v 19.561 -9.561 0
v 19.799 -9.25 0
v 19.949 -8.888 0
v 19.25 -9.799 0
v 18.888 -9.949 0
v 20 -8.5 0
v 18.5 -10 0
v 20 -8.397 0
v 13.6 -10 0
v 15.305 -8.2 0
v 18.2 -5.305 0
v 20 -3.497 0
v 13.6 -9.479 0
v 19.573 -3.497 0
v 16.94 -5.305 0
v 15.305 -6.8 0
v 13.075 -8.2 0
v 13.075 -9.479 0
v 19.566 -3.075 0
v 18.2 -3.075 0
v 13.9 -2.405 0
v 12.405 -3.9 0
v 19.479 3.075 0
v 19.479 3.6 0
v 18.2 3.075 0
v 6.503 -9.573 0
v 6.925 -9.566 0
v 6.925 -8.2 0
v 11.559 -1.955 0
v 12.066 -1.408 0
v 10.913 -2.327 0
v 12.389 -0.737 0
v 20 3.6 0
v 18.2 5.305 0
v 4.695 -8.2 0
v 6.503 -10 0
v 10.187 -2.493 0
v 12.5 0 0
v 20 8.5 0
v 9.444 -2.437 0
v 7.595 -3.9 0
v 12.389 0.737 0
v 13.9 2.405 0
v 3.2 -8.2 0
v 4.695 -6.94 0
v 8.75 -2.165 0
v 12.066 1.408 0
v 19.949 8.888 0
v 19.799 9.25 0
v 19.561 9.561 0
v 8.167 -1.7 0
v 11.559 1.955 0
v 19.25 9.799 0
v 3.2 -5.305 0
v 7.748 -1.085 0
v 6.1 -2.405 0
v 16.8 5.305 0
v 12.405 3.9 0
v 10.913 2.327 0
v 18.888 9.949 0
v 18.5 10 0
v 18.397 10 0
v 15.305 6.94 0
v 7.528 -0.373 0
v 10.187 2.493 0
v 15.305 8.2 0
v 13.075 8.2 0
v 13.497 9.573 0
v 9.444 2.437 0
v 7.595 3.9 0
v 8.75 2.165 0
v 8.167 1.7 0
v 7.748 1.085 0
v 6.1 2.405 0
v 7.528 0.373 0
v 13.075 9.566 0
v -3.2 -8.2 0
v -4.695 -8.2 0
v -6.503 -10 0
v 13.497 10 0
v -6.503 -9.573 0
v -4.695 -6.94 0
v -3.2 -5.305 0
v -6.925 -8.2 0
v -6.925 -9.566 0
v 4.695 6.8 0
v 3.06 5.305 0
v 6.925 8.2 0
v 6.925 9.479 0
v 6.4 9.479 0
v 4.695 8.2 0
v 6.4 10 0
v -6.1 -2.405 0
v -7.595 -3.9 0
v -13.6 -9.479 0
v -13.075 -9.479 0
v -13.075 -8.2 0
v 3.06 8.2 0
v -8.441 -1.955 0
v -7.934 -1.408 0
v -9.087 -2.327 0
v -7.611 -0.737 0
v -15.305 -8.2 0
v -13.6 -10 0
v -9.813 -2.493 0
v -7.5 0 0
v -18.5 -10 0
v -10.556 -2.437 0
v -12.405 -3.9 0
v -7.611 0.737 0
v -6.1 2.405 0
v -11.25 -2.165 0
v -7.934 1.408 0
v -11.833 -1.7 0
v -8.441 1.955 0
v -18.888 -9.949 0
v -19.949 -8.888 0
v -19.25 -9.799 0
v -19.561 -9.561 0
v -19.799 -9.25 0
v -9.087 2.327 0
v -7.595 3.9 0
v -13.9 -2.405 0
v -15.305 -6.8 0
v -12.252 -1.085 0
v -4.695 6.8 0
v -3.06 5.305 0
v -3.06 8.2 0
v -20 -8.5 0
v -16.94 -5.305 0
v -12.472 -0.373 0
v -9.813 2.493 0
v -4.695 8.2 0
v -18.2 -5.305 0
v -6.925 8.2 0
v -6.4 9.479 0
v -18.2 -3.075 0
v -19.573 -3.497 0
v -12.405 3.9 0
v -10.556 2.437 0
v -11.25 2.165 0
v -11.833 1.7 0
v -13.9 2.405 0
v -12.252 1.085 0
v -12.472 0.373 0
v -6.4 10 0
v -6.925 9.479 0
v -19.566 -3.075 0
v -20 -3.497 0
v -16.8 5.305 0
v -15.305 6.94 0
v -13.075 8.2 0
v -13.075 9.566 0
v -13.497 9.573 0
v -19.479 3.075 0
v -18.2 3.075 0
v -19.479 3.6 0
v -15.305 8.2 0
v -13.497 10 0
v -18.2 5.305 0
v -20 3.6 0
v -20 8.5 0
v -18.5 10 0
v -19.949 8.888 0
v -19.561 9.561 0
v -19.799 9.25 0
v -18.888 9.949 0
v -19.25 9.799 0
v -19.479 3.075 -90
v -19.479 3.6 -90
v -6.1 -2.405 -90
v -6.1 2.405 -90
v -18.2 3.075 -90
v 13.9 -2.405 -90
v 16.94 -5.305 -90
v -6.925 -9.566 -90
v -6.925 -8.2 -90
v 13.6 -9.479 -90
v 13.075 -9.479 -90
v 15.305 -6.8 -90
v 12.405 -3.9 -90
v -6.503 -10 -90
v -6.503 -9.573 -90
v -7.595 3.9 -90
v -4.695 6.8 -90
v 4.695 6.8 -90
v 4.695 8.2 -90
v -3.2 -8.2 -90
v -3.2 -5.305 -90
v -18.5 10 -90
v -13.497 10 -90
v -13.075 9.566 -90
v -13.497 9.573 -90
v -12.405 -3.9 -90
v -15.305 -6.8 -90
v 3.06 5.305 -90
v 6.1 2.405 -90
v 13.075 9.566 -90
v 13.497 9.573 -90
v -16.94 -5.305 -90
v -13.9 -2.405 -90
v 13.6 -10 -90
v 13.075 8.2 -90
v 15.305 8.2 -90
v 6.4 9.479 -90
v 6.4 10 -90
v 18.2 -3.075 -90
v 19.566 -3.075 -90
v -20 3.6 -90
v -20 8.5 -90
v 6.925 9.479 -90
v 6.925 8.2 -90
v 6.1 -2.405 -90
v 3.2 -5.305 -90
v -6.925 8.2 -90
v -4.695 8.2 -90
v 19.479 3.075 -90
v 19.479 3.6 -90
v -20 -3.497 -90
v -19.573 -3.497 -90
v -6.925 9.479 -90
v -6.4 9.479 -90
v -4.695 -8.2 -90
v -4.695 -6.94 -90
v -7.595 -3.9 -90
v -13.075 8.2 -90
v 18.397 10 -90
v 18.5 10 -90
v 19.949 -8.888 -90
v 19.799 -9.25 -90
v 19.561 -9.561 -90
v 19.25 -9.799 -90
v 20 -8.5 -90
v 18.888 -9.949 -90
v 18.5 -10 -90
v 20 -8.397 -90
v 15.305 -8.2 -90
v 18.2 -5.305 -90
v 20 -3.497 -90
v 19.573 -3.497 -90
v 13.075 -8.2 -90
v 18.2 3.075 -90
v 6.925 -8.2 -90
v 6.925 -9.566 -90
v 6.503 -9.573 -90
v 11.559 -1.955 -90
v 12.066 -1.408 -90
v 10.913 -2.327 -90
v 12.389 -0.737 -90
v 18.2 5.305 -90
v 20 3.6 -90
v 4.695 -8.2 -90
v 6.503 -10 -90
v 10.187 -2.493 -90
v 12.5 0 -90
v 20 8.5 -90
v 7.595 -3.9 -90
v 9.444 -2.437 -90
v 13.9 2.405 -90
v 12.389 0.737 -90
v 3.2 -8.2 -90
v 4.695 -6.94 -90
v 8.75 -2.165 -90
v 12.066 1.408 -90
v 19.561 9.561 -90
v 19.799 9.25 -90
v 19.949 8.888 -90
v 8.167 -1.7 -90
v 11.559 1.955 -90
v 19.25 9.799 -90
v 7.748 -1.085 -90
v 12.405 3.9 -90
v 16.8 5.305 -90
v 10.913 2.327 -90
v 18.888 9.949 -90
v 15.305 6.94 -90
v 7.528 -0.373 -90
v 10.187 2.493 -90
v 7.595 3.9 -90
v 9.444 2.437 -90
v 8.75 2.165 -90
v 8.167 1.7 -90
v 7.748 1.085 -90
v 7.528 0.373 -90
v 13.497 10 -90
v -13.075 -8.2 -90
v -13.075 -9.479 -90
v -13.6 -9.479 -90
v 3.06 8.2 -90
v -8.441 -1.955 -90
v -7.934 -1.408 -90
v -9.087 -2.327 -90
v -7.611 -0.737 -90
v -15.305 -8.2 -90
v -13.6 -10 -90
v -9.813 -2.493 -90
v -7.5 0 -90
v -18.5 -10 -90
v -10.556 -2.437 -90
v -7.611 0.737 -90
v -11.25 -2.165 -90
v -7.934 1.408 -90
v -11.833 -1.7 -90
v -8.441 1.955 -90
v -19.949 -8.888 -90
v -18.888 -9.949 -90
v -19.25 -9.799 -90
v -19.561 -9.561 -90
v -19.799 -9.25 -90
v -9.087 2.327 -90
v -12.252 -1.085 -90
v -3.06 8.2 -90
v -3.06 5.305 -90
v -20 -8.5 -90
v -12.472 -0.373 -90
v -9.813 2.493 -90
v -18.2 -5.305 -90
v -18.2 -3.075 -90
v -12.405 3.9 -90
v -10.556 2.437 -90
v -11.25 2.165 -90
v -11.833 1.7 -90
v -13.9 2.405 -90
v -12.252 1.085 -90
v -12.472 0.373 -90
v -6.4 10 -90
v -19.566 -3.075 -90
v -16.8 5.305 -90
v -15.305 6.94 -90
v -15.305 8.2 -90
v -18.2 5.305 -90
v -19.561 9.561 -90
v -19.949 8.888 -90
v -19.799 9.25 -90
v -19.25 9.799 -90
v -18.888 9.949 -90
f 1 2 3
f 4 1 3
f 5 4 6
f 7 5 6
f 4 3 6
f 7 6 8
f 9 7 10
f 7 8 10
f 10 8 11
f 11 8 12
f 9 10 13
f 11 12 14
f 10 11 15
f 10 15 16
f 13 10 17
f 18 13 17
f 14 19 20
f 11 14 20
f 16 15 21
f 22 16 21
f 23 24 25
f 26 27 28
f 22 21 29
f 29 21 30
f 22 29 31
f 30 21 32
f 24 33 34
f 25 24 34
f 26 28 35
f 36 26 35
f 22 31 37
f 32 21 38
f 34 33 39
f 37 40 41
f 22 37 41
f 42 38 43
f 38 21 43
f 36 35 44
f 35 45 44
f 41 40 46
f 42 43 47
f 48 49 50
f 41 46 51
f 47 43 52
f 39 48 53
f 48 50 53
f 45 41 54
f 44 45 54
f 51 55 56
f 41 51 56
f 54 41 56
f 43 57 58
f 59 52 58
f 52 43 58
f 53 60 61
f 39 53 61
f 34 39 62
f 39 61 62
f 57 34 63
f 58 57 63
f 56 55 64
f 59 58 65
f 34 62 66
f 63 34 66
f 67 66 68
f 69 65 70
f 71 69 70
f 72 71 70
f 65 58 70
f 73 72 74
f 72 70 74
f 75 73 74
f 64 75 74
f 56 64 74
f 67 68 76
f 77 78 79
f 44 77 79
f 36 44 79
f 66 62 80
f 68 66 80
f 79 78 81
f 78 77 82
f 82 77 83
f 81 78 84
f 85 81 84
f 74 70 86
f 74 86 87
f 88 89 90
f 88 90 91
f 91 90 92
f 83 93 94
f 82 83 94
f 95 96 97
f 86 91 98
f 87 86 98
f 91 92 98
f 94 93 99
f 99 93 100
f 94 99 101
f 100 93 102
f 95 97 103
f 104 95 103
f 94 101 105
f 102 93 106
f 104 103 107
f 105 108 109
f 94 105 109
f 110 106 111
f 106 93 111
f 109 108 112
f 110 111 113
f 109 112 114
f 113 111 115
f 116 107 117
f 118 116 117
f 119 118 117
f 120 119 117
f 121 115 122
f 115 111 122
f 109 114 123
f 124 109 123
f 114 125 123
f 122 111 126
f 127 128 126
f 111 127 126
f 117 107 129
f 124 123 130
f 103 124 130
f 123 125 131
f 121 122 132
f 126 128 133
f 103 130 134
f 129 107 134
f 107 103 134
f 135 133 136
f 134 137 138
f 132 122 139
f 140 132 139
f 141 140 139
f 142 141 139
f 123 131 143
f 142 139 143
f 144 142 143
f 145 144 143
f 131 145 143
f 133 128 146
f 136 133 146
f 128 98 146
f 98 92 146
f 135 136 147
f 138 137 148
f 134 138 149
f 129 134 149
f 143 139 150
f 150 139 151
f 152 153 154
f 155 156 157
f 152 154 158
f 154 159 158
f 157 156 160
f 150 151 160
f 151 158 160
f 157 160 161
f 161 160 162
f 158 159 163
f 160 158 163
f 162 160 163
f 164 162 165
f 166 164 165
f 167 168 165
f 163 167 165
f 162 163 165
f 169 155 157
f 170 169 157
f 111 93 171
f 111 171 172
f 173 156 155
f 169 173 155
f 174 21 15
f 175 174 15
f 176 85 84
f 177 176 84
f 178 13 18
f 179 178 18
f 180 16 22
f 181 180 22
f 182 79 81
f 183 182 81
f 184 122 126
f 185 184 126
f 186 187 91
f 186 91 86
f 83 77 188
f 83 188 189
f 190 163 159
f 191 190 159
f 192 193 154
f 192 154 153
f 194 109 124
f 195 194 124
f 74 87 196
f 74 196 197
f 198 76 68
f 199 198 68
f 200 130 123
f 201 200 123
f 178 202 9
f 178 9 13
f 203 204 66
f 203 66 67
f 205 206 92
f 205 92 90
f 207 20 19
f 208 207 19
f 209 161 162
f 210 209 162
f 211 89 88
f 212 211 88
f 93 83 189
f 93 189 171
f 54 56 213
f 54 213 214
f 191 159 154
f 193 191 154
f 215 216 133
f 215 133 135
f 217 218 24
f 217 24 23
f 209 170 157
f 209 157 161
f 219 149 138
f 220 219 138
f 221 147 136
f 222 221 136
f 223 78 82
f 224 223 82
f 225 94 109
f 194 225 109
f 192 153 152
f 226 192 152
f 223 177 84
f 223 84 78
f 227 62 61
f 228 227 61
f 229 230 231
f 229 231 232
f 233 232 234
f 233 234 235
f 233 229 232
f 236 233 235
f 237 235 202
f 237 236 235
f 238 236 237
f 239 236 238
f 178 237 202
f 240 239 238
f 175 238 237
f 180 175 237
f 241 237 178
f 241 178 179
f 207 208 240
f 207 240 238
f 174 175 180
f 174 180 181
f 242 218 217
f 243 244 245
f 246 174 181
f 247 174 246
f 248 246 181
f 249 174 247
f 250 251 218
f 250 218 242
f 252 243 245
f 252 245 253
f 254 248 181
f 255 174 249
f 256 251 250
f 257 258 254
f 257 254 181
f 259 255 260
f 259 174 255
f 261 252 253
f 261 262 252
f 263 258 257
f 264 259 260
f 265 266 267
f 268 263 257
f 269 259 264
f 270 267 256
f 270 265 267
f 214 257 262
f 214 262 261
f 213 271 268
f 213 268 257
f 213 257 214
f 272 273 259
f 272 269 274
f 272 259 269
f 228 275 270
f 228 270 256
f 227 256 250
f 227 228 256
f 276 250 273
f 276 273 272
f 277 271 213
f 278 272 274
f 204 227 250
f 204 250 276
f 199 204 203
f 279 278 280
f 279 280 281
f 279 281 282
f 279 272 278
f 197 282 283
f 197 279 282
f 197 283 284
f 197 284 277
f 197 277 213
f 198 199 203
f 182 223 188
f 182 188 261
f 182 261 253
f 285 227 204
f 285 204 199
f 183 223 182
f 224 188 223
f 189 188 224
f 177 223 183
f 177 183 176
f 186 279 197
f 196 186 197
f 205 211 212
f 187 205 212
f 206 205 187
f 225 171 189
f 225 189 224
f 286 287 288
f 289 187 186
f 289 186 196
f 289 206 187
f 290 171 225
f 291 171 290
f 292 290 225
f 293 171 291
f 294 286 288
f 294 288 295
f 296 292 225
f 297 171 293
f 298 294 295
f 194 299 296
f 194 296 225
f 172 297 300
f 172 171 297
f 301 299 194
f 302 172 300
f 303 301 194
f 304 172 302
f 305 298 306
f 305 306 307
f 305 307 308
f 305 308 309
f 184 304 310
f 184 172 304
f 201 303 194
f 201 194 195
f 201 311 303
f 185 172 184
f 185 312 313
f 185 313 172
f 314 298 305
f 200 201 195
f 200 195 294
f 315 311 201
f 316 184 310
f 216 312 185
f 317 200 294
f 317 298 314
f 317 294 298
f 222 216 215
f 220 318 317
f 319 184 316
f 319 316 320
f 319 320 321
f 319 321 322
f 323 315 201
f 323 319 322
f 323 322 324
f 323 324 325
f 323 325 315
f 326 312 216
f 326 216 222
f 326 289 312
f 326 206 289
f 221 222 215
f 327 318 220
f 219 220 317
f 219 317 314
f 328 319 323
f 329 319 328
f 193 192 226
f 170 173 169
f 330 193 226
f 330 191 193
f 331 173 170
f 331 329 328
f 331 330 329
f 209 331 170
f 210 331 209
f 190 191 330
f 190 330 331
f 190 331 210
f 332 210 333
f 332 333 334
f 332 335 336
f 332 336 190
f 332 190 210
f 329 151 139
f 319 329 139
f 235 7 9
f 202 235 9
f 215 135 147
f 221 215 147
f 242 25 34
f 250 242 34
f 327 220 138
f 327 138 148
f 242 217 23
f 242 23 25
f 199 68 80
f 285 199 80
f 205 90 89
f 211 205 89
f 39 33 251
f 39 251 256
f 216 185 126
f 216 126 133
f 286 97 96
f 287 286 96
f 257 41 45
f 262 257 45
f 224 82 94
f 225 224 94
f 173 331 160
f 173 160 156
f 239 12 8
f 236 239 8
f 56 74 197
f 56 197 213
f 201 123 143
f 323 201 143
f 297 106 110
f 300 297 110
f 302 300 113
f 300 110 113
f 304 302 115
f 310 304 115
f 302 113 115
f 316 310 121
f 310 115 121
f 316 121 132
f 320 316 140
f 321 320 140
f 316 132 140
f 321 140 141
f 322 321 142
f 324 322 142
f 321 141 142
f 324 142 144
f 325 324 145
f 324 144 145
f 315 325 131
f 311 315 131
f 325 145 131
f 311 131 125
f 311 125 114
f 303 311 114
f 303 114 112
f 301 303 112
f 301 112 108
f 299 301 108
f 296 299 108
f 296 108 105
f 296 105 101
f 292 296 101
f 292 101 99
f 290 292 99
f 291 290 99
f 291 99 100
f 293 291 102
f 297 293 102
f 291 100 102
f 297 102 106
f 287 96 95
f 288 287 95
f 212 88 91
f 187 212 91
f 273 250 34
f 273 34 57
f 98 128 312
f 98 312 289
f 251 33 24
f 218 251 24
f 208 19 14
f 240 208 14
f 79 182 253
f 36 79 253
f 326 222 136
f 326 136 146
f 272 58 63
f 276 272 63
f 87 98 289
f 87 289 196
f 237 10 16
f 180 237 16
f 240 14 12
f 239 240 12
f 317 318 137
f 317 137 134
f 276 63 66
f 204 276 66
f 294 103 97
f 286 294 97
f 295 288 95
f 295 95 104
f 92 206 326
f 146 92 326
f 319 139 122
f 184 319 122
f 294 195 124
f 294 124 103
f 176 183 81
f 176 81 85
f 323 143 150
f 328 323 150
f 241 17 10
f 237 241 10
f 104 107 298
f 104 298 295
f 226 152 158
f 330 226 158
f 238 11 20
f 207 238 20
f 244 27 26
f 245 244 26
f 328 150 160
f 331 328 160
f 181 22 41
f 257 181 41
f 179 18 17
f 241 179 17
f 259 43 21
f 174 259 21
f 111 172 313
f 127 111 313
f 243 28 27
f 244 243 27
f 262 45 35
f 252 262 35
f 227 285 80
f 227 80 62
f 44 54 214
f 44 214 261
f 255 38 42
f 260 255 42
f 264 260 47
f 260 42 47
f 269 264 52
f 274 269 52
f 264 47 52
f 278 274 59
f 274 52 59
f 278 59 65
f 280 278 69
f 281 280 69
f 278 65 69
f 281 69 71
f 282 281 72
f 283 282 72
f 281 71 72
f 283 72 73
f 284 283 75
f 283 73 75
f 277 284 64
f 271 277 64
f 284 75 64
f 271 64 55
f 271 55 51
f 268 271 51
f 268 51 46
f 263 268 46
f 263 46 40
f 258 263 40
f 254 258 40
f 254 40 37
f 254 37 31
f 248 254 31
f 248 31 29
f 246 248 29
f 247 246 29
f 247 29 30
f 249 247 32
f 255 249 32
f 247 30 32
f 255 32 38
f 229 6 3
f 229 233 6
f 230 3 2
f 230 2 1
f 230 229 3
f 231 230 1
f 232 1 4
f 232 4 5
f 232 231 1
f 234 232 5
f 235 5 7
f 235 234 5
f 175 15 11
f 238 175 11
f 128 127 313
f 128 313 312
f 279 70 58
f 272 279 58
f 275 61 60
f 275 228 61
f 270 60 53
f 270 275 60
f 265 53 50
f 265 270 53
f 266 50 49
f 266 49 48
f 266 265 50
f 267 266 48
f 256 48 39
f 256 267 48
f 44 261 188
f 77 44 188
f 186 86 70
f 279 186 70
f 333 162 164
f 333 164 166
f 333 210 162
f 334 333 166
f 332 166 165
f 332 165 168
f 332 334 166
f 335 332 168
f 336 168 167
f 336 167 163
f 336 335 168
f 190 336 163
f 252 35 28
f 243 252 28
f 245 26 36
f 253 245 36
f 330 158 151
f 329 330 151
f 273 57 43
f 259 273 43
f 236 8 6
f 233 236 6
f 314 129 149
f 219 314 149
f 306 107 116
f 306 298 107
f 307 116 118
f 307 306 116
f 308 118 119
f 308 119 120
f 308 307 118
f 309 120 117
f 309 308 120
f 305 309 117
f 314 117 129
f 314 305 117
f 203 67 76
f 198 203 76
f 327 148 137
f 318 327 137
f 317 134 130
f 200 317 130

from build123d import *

# Parameters (mm, degrees)
SKETCH1_R           = 2.5
BOSS_EXTRUDE1_DEPTH = 90
FILLET1_R           = 1.5


with BuildPart() as part:
    # Sketch1 → Boss-Extrude1 (new body)
    with BuildSketch(Plane.XY):
        Polygon((-1.499992211, 10), (2.38e-06, 10), (1.500001785, 10), (6.400001785, 10), (6.400001785, 9.479132912), (6.925001785, 9.479132912), (6.925001785, 8.2), (4.695347664, 8.2), (4.695347664, 6.8), (7.595347664, 3.9), (12.404655907, 3.9), (15.304655907, 6.94037733), (15.304655907, 8.199999348), (13.075001785, 8.199999348), (13.075001785, 9.565762703), (13.497472172, 9.573136951), (13.497472172, 9.999999348), (18.397472172, 9.999999348), (20.000001785, 10), (20.000001785, 8.503508491), (20.000001785, 8.500000005), (20.000001785, 3.600001911), (19.479137611, 3.600002038), (19.479137484, 3.075002038), (18.200004571, 3.075002348), (18.200005113, 5.30465647), (16.800005113, 5.30465681), (13.900004408, 2.404657514), (13.900003241, -2.404650729), (16.940379867, -5.304651467), (18.200002536, -5.304651773), (18.200003078, -3.074997652), (19.565766433, -3.074997983), (19.573140578, -3.497468372), (20.000002975, -3.497468476), (20.000001785, -8.397468476), (20.000001785, -10), (18.500003987, -10), (13.600003987, -9.99999881), (13.600004114, -9.479131722), (13.075004114, -9.479131595), (13.075004424, -8.199998683), (15.304655907, -8.199999224), (15.304655907, -6.8), (12.404655907, -3.9), (7.595347664, -3.9), (4.695347664, -6.94037733), (4.695347664, -8.2), (6.925001785, -8.2), (6.925001785, -9.565763355), (6.502531399, -9.573137603), (6.502531399, -10), (1.602531399, -10), (2.38e-06, -10), (-1.602527233, -10), (-6.502525798, -10), (-6.502525798, -9.573137078), (-6.92499762, -9.565763355), (-6.92499762, -8.2), (-4.695343498, -8.2), (-4.695343498, -6.94037733), (-7.595343498, -3.9), (-12.404651741, -3.9), (-15.304651741, -6.8), (-15.304651741, -8.2), (-13.07499762, -8.2), (-13.07499762, -9.479132912), (-13.600001017, -9.479132912), (-13.600001017, -10), (-18.49999954, -10), (-19.99999762, -10), (-19.99999762, -3.497471822), (-19.573134698, -3.497471822), (-19.565760974, -3.075), (-18.19999762, -3.075), (-18.19999762, -5.304654122), (-16.94037495, -5.304654122), (-13.89999762, -2.404654122), (-13.89999762, 2.404654122), (-16.79999762, 5.304654122), (-18.19999762, 5.304654122), (-18.19999762, 3.075), (-19.479130532, 3.075), (-19.479130532, 3.600003398), (-19.99999762, 3.600003398), (-19.99999762, 10), (-13.497469442, 10), (-13.497469442, 9.573137078), (-13.07499762, 9.565763355), (-13.07499762, 8.2), (-15.304651741, 8.2), (-15.304651741, 6.94037733), (-12.404651741, 3.9), (-7.595343498, 3.9), (-4.695343498, 6.8), (-4.695343498, 8.2), (-6.92499762, 8.2), (-6.92499762, 9.479132912), (-6.399994222, 9.479132912), (-6.399994222, 10), align=None)
        with Locations((-9.99999762, 0)):
            Circle(SKETCH1_R, mode=Mode.SUBTRACT)
        with Locations((9.99999762, 0)):
            Circle(SKETCH1_R, mode=Mode.SUBTRACT)
        Polygon((-3.059620289, 5.304654122), (-3.059620289, 8.2), (2.38e-06, 8.2), (3.059624455, 8.2), (3.059624455, 5.304654122), (6.100001785, 2.404654122), (6.100001785, -2.404654122), (3.200001785, -5.304654122), (3.200001785, -8.2), (2.38e-06, -8.2), (-3.19999762, -8.2), (-3.19999762, -5.304654122), (-6.09999762, -2.404654122), (-6.09999762, 2.404654122), align=None, mode=Mode.SUBTRACT)
    extrude(amount=-BOSS_EXTRUDE1_DEPTH)

    # Fillet1
    fillet1_edges = [part.edges().sort_by_distance(p)[0] for p in [
        (20.000001785, 10, -45),
        (20.000001785, -10, -45),
        (-19.99999762, -10, -45),
        (-19.99999762, 10, -45),
    ]]
    fillet(fillet1_edges, radius=FILLET1_R - 0.0001)  # a hair under: the kernel refuses the full size


solid = part.part
